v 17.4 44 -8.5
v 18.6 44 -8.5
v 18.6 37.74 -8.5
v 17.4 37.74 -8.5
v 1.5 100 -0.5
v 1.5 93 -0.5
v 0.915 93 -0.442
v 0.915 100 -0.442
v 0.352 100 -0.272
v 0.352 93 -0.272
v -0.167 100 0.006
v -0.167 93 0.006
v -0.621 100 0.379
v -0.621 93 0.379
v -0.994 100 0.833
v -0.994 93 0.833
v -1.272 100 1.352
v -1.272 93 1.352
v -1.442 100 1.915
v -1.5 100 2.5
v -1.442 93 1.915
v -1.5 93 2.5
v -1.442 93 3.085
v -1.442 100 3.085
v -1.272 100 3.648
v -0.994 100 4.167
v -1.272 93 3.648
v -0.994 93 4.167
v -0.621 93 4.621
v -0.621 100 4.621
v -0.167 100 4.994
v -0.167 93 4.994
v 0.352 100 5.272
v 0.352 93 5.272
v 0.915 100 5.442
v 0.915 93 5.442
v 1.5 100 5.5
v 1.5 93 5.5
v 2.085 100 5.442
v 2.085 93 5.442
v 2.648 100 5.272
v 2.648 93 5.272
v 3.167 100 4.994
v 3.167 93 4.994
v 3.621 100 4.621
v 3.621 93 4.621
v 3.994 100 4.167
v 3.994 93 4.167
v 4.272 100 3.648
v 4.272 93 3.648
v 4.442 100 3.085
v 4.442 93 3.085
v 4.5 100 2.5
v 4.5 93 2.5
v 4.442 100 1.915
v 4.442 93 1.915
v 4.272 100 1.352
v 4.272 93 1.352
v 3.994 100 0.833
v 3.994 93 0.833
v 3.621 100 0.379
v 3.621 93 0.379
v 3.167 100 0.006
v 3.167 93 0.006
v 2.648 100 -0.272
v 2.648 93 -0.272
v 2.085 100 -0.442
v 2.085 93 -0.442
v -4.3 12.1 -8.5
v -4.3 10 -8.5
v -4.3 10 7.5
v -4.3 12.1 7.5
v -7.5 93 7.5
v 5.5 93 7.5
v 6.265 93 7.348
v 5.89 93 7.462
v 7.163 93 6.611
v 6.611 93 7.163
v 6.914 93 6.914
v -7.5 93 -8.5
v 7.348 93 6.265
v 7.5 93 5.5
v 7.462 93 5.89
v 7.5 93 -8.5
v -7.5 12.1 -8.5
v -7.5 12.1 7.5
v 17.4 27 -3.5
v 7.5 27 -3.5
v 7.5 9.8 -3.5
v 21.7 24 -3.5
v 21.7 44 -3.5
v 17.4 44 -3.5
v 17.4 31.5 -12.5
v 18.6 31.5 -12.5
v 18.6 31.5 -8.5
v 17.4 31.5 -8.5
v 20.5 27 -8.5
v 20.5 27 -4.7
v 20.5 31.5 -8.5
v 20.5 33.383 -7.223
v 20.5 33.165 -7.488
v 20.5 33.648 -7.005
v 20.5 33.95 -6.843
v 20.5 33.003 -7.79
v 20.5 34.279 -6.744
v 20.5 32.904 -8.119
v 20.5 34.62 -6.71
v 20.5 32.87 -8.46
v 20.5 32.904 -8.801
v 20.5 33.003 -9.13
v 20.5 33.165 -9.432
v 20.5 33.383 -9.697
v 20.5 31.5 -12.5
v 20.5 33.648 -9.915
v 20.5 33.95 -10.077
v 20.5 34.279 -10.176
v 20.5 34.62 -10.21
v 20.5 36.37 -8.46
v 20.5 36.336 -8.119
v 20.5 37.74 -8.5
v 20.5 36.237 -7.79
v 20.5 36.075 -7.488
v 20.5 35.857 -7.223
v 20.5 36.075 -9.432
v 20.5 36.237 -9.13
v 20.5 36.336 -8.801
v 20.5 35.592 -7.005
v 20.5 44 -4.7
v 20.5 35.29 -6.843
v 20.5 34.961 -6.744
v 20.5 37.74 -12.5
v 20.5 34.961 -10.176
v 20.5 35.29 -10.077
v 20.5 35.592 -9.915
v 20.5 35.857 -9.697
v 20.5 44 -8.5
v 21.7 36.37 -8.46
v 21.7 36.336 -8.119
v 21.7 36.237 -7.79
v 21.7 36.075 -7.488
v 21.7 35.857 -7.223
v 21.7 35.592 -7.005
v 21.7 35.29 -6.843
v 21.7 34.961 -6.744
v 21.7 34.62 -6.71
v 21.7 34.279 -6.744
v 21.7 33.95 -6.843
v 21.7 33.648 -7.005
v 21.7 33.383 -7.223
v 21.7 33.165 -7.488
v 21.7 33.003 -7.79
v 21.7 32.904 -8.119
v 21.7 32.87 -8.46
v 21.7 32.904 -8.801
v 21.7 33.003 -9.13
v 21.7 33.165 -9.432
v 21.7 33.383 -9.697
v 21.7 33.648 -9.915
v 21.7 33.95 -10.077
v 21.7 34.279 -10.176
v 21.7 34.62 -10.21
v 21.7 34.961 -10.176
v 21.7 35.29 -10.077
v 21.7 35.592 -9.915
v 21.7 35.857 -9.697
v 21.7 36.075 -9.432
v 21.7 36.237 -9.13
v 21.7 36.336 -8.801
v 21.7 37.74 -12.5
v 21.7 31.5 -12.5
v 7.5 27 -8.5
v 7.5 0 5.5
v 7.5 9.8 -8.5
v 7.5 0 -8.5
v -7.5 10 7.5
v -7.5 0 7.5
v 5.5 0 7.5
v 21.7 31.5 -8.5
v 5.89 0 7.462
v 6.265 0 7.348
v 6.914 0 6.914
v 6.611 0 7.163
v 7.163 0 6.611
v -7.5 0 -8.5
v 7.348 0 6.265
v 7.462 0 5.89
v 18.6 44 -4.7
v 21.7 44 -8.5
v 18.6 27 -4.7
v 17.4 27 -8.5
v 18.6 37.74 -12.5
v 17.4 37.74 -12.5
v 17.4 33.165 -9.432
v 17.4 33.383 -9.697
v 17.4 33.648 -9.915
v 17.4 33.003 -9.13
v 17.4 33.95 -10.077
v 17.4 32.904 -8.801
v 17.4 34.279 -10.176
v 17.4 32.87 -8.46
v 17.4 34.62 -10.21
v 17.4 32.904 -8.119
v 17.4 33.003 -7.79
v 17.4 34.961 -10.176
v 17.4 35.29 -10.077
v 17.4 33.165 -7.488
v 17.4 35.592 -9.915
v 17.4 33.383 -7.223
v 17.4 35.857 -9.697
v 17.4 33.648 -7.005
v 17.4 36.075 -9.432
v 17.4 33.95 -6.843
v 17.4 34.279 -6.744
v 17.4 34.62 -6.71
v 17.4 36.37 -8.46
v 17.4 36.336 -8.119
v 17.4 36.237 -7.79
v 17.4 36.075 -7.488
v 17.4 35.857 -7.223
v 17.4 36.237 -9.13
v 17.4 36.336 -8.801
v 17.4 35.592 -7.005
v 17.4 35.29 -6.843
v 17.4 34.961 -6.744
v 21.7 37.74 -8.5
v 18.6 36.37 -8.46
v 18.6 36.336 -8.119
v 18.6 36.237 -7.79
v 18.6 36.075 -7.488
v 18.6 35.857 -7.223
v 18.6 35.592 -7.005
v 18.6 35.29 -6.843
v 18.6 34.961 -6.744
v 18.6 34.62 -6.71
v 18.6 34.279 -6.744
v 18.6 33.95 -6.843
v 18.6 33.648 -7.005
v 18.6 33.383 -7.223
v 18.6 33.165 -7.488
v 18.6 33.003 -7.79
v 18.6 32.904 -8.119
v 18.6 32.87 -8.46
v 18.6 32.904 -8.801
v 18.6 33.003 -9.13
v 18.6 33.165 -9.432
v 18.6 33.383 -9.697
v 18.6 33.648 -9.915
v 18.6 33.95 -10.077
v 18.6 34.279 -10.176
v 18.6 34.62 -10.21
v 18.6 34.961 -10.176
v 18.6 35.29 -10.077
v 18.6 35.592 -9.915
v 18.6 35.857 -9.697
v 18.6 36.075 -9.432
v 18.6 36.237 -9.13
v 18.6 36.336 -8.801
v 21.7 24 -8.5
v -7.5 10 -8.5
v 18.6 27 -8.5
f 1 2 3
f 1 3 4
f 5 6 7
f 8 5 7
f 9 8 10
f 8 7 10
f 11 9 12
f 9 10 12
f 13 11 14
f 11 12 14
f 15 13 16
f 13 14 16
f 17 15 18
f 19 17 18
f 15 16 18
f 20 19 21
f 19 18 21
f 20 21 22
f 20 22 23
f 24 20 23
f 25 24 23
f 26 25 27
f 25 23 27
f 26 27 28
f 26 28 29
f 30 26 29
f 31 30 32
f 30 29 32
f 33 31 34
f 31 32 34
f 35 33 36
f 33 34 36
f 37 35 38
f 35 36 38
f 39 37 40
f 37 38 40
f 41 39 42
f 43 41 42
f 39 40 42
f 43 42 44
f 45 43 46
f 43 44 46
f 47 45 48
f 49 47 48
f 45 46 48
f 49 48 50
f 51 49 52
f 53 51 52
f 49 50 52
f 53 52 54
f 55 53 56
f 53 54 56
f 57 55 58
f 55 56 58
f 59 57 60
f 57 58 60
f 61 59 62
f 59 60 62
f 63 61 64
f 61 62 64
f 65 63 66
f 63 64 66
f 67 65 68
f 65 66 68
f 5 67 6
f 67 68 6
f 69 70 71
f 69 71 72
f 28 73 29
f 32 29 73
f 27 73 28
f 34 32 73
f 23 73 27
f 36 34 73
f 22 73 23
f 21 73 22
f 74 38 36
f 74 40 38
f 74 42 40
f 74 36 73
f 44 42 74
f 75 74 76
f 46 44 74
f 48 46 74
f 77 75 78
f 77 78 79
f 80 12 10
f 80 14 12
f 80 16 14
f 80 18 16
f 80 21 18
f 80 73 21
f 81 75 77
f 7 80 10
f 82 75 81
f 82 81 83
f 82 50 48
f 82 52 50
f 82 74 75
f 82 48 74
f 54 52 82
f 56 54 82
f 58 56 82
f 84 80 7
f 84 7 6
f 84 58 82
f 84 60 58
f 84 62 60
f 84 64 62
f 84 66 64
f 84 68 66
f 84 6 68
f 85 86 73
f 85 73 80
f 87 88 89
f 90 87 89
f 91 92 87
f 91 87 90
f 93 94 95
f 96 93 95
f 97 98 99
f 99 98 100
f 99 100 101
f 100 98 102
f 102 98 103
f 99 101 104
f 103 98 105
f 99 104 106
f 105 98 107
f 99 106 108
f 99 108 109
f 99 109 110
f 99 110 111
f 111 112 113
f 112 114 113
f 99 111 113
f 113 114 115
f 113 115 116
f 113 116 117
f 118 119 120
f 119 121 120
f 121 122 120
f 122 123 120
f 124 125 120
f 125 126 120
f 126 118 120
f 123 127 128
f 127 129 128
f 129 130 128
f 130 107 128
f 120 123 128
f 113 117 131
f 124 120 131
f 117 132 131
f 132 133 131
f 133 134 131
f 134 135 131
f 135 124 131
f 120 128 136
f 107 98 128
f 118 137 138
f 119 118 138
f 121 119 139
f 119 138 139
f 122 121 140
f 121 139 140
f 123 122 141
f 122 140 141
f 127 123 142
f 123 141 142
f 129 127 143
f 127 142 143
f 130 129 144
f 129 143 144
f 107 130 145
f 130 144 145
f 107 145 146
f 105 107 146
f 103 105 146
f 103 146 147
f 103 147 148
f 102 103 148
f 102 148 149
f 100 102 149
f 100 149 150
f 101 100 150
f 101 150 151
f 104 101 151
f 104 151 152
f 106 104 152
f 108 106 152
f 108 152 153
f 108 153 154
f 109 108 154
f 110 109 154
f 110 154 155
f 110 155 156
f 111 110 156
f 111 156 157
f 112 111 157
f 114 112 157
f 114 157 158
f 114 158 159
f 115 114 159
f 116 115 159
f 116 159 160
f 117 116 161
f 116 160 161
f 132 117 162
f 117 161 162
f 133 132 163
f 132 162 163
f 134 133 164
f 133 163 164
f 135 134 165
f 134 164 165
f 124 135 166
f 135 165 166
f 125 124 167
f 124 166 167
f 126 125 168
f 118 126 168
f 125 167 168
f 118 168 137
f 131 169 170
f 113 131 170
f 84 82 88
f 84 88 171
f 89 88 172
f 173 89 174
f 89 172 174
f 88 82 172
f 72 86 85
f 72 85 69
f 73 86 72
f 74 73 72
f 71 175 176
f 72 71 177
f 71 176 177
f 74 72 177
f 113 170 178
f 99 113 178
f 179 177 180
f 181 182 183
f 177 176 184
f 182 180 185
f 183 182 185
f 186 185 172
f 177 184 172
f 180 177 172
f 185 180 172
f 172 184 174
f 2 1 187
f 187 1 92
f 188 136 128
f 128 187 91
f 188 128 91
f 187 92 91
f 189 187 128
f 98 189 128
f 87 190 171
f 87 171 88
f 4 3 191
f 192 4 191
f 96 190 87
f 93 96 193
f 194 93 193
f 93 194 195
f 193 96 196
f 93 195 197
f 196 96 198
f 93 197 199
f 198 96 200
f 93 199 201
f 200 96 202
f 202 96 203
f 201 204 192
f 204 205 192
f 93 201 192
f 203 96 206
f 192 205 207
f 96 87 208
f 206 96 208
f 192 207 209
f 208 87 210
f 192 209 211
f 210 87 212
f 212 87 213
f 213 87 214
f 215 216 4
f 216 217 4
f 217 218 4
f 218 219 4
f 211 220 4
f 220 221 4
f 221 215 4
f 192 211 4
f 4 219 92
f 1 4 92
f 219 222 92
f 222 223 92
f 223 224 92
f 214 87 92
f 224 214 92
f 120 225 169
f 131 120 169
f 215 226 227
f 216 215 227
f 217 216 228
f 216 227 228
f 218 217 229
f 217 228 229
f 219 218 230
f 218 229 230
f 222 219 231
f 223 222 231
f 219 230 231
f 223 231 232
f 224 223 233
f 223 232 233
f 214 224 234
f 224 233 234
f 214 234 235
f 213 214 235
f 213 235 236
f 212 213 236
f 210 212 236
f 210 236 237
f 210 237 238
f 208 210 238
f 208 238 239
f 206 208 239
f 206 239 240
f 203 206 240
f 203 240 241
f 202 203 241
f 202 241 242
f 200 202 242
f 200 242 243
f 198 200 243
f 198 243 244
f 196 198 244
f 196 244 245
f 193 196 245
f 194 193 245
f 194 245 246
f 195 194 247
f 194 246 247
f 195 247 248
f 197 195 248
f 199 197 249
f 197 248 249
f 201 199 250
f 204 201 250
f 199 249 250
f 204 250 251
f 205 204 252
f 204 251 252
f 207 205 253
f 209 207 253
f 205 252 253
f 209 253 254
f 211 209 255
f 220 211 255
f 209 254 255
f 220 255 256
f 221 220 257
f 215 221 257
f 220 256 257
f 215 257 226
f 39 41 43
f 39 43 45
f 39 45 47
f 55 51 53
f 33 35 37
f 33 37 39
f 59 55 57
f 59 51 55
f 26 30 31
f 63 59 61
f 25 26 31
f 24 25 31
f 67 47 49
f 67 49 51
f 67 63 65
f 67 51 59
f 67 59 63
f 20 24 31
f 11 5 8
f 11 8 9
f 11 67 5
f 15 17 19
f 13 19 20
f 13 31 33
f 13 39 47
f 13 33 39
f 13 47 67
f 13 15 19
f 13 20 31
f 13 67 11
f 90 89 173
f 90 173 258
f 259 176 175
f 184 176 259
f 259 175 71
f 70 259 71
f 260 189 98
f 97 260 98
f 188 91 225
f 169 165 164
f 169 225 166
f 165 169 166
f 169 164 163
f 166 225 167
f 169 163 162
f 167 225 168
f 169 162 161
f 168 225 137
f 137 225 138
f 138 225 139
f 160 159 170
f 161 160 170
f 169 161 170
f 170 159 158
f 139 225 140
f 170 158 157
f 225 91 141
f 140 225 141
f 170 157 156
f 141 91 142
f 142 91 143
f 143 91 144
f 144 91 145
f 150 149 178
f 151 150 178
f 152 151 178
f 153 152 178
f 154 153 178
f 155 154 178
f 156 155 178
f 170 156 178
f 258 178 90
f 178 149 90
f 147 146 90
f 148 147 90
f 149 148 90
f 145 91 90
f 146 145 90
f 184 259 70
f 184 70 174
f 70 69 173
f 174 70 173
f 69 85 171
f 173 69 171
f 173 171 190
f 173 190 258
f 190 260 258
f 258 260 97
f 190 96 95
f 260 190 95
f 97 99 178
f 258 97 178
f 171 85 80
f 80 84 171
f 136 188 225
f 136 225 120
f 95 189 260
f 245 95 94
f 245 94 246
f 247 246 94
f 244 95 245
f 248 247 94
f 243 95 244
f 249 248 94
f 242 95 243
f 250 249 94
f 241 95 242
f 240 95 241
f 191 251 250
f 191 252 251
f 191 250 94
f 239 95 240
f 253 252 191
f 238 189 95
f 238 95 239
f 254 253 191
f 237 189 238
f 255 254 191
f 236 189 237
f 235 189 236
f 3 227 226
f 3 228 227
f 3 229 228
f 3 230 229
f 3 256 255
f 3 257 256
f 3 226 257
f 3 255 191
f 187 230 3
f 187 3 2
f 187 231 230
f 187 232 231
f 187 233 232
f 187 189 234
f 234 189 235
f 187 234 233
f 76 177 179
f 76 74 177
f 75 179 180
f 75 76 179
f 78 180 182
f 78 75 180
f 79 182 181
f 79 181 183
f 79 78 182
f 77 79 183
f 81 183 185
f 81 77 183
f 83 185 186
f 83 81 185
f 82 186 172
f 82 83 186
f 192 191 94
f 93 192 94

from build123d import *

# Parameters (mm, degrees)
SKETCH1_W                       = 15
SKETCH1_H                       = 15
BOSS_EXTRUDE1_DEPTH             = 93
SKETCH2_R                       = 3
BOSS_EXTRUDE2_DEPTH             = 7
FILLET1_R                       = 2
BOSS_EXTRUDE3_DEPTH             = 1
BOSS_EXTRUDE3_DEPTH_BACK        = 4
SKETCH5_W                       = 1.2
SKETCH5_H                       = 17
SKETCH6_W                       = 4.3
SKETCH6_H                       = 20
BOSS_EXTRUDE4_DEPTH             = 1.2
BOSS_EXTRUDE5_REACH             = 106.522
SKETCH9_W                       = 1.9
SKETCH9_H                       = 20
CUT_EXTRUDE2_DEPTH              = 17
SKETCH10_R                      = 1.75
CUT_EXTRUDE3_DEPTH              = 10
SKETCH11_W                      = 1
SKETCH11_H                      = 3
BOSS_EXTRUDE6_DEPTH             = 15
BOSS_EXTRUDE7_REACH             = 79.176
SKETCH12_W                      = 15
SKETCH12_H                      = 1
BOSS_EXTRUDE7_DIRECTION_2_REACH = 79.176
SKETCH3_W                       = 3.2
SKETCH3_H                       = 2.1
CUT_EXTRUDE1_DEPTH              = 105.263560269
BOSS_EXTRUDE8_DEPTH             = 5


with BuildPart() as part:
    # Sketch1 → Boss-Extrude1 (new body)
    with BuildSketch(Plane(origin=(0, 0, 0), x_dir=(1, 0, 0), z_dir=(0, 1, 0))):
        Rectangle(SKETCH1_W, SKETCH1_H)
    extrude(amount=BOSS_EXTRUDE1_DEPTH)

    # Sketch2 → Boss-Extrude2 (add)
    with BuildSketch(Plane(origin=(0, 93, 0), x_dir=(1, 0, 0), z_dir=(0, 1, 0))):
        with Locations(Location((1.5, -2.5, 0), (0, 0, 90))):
            Circle(SKETCH2_R)
    extrude(amount=BOSS_EXTRUDE2_DEPTH)

    # Fillet1
    fillet1_edges = [part.edges().sort_by_distance(p)[0] for p in [
        (7.5, 46.5, 7.5),
    ]]
    fillet(fillet1_edges, radius=FILLET1_R)

    # Sketch5 → Boss-Extrude3 (add, two sides: drawn at the far end of the back side and taken through both)
    with BuildSketch(Plane(origin=(0, 0, -7.5), x_dir=(-1, 0, 0), z_dir=(0, 0, -1)).offset(-BOSS_EXTRUDE3_DEPTH_BACK)):
        Polygon((-21.7, 24), (-7.5, 24), (-7.5, 27), (-17.4, 27), (-18.6, 27), (-20.5, 27), (-20.5, 44), (-21.7, 44), align=None)
        with Locations((-18, 35.5)):
            Rectangle(SKETCH5_W, SKETCH5_H)
    extrude(amount=BOSS_EXTRUDE3_DEPTH + BOSS_EXTRUDE3_DEPTH_BACK)

    # Sketch6 → Boss-Extrude4 (add)
    with BuildSketch(Plane.XY.offset(-3.5)):
        with Locations((19.55, 34)):
            Rectangle(SKETCH6_W, SKETCH6_H)
    extrude(amount=-BOSS_EXTRUDE4_DEPTH)

    # Boss-Extrude5: up to this face of the body (flat: up to its plane)
    boss_extrude5_end = Plane(part.part.faces().sort_by_distance((17.4, 35.5, -6))[0])
    # Sketch7 → Boss-Extrude5 (add, up to the picked face)
    with BuildSketch(Plane(origin=(21.7, 0, 0), x_dir=(0, 0, -1), z_dir=(1, 0, 0)), mode=Mode.PRIVATE) as boss_extrude5_sk1:
        Polygon((5.5, 34.5), (5.5, 44), (8.5, 44), (8.5, 37.74), (12.5, 37.74), (12.5, 31.5), (8.5, 31.5), align=None)
    boss_extrude5_tool1 = split(extrude(boss_extrude5_sk1.sketch, amount=-BOSS_EXTRUDE5_REACH, mode=Mode.PRIVATE), bisect_by=boss_extrude5_end, keep=Keep.BOTH, mode=Mode.PRIVATE)
    add(boss_extrude5_tool1.solids().sort_by(Axis((21.7, 36.8097, -8.546066), (-1, 0, 0)))[0])

    # Sketch9 → Cut-Extrude2 (cut)
    with BuildSketch(Plane(origin=(0, 44, 0), x_dir=(1, 0, 0), z_dir=(0, 1, 0))):
        with Locations((19.55, 14.7)):
            Rectangle(SKETCH9_W, SKETCH9_H)
    extrude(amount=-CUT_EXTRUDE2_DEPTH, mode=Mode.SUBTRACT)

    # Sketch10 → Cut-Extrude3 (cut)
    with BuildSketch(Plane(origin=(21.7, 0, 0), x_dir=(0, 0, -1), z_dir=(1, 0, 0))):
        with Locations(Location((8.46, 34.62, 0), (0, 0, 90))):
            Circle(SKETCH10_R)
    extrude(amount=-CUT_EXTRUDE3_DEPTH, mode=Mode.SUBTRACT)

    # Sketch11 → Boss-Extrude6 (add)
    with BuildSketch(Plane.ZY.offset(-7.5)):
        with Locations((-8, 25.5)):
            Rectangle(SKETCH11_W, SKETCH11_H)
    extrude(amount=BOSS_EXTRUDE6_DEPTH)

    # Boss-Extrude7: up to this face of the body (flat: up to its plane)
    boss_extrude7_end = Plane(part.part.faces().sort_by_distance((-0.247443472, 93, -0.391798042))[0])
    # Sketch12 → Boss-Extrude7 (add, up to the picked face)
    with BuildSketch(Plane(origin=(0, 27, 0), x_dir=(1, 0, 0), z_dir=(0, 1, 0)), mode=Mode.PRIVATE) as boss_extrude7_sk1:
        with Locations((0, 8)):
            Rectangle(SKETCH12_W, SKETCH12_H)
    boss_extrude7_tool1 = split(extrude(boss_extrude7_sk1.sketch, amount=BOSS_EXTRUDE7_REACH, mode=Mode.PRIVATE), bisect_by=boss_extrude7_end, keep=Keep.BOTH, mode=Mode.PRIVATE)
    add(boss_extrude7_tool1.solids().sort_by(Axis((0, 27, -8), (0, 1, 0)))[0])

    # Boss-Extrude7 direction 2: up to this face of the body (flat: up to its plane)
    boss_extrude7_direction_2_end = Plane(part.part.faces().sort_by_distance((-0.027012272, 0, -0.027012272))[0])
    # Sketch12 → Boss-Extrude7 direction 2 (add, up to the picked face)
    with BuildSketch(Plane(origin=(0, 27, 0), x_dir=(1, 0, 0), z_dir=(0, 1, 0)), mode=Mode.PRIVATE) as boss_extrude7_direction_2_sk1:
        with Locations((0, 8)):
            Rectangle(SKETCH12_W, SKETCH12_H)
    boss_extrude7_direction_2_tool1 = split(extrude(boss_extrude7_direction_2_sk1.sketch, amount=-BOSS_EXTRUDE7_DIRECTION_2_REACH, mode=Mode.PRIVATE), bisect_by=boss_extrude7_direction_2_end, keep=Keep.BOTH, mode=Mode.PRIVATE)
    add(boss_extrude7_direction_2_tool1.solids().sort_by(Axis((0, 27, -8), (0, -1, 0)))[0])

    # Sketch3 → Cut-Extrude1 (cut, through all)
    with BuildSketch(Plane.XY.offset(7.5)):
        with Locations((-5.9, 11.05)):
            Rectangle(SKETCH3_W, SKETCH3_H)
    extrude(amount=-CUT_EXTRUDE1_DEPTH, mode=Mode.SUBTRACT)

    # Sketch13 → Boss-Extrude8 (add)
    with BuildSketch(Plane.XY.offset(-3.5)):
        Polygon((21.7, 24), (7.5, 24), (7.5, 9.8), align=None)
    extrude(amount=-BOSS_EXTRUDE8_DEPTH)


solid = part.part
